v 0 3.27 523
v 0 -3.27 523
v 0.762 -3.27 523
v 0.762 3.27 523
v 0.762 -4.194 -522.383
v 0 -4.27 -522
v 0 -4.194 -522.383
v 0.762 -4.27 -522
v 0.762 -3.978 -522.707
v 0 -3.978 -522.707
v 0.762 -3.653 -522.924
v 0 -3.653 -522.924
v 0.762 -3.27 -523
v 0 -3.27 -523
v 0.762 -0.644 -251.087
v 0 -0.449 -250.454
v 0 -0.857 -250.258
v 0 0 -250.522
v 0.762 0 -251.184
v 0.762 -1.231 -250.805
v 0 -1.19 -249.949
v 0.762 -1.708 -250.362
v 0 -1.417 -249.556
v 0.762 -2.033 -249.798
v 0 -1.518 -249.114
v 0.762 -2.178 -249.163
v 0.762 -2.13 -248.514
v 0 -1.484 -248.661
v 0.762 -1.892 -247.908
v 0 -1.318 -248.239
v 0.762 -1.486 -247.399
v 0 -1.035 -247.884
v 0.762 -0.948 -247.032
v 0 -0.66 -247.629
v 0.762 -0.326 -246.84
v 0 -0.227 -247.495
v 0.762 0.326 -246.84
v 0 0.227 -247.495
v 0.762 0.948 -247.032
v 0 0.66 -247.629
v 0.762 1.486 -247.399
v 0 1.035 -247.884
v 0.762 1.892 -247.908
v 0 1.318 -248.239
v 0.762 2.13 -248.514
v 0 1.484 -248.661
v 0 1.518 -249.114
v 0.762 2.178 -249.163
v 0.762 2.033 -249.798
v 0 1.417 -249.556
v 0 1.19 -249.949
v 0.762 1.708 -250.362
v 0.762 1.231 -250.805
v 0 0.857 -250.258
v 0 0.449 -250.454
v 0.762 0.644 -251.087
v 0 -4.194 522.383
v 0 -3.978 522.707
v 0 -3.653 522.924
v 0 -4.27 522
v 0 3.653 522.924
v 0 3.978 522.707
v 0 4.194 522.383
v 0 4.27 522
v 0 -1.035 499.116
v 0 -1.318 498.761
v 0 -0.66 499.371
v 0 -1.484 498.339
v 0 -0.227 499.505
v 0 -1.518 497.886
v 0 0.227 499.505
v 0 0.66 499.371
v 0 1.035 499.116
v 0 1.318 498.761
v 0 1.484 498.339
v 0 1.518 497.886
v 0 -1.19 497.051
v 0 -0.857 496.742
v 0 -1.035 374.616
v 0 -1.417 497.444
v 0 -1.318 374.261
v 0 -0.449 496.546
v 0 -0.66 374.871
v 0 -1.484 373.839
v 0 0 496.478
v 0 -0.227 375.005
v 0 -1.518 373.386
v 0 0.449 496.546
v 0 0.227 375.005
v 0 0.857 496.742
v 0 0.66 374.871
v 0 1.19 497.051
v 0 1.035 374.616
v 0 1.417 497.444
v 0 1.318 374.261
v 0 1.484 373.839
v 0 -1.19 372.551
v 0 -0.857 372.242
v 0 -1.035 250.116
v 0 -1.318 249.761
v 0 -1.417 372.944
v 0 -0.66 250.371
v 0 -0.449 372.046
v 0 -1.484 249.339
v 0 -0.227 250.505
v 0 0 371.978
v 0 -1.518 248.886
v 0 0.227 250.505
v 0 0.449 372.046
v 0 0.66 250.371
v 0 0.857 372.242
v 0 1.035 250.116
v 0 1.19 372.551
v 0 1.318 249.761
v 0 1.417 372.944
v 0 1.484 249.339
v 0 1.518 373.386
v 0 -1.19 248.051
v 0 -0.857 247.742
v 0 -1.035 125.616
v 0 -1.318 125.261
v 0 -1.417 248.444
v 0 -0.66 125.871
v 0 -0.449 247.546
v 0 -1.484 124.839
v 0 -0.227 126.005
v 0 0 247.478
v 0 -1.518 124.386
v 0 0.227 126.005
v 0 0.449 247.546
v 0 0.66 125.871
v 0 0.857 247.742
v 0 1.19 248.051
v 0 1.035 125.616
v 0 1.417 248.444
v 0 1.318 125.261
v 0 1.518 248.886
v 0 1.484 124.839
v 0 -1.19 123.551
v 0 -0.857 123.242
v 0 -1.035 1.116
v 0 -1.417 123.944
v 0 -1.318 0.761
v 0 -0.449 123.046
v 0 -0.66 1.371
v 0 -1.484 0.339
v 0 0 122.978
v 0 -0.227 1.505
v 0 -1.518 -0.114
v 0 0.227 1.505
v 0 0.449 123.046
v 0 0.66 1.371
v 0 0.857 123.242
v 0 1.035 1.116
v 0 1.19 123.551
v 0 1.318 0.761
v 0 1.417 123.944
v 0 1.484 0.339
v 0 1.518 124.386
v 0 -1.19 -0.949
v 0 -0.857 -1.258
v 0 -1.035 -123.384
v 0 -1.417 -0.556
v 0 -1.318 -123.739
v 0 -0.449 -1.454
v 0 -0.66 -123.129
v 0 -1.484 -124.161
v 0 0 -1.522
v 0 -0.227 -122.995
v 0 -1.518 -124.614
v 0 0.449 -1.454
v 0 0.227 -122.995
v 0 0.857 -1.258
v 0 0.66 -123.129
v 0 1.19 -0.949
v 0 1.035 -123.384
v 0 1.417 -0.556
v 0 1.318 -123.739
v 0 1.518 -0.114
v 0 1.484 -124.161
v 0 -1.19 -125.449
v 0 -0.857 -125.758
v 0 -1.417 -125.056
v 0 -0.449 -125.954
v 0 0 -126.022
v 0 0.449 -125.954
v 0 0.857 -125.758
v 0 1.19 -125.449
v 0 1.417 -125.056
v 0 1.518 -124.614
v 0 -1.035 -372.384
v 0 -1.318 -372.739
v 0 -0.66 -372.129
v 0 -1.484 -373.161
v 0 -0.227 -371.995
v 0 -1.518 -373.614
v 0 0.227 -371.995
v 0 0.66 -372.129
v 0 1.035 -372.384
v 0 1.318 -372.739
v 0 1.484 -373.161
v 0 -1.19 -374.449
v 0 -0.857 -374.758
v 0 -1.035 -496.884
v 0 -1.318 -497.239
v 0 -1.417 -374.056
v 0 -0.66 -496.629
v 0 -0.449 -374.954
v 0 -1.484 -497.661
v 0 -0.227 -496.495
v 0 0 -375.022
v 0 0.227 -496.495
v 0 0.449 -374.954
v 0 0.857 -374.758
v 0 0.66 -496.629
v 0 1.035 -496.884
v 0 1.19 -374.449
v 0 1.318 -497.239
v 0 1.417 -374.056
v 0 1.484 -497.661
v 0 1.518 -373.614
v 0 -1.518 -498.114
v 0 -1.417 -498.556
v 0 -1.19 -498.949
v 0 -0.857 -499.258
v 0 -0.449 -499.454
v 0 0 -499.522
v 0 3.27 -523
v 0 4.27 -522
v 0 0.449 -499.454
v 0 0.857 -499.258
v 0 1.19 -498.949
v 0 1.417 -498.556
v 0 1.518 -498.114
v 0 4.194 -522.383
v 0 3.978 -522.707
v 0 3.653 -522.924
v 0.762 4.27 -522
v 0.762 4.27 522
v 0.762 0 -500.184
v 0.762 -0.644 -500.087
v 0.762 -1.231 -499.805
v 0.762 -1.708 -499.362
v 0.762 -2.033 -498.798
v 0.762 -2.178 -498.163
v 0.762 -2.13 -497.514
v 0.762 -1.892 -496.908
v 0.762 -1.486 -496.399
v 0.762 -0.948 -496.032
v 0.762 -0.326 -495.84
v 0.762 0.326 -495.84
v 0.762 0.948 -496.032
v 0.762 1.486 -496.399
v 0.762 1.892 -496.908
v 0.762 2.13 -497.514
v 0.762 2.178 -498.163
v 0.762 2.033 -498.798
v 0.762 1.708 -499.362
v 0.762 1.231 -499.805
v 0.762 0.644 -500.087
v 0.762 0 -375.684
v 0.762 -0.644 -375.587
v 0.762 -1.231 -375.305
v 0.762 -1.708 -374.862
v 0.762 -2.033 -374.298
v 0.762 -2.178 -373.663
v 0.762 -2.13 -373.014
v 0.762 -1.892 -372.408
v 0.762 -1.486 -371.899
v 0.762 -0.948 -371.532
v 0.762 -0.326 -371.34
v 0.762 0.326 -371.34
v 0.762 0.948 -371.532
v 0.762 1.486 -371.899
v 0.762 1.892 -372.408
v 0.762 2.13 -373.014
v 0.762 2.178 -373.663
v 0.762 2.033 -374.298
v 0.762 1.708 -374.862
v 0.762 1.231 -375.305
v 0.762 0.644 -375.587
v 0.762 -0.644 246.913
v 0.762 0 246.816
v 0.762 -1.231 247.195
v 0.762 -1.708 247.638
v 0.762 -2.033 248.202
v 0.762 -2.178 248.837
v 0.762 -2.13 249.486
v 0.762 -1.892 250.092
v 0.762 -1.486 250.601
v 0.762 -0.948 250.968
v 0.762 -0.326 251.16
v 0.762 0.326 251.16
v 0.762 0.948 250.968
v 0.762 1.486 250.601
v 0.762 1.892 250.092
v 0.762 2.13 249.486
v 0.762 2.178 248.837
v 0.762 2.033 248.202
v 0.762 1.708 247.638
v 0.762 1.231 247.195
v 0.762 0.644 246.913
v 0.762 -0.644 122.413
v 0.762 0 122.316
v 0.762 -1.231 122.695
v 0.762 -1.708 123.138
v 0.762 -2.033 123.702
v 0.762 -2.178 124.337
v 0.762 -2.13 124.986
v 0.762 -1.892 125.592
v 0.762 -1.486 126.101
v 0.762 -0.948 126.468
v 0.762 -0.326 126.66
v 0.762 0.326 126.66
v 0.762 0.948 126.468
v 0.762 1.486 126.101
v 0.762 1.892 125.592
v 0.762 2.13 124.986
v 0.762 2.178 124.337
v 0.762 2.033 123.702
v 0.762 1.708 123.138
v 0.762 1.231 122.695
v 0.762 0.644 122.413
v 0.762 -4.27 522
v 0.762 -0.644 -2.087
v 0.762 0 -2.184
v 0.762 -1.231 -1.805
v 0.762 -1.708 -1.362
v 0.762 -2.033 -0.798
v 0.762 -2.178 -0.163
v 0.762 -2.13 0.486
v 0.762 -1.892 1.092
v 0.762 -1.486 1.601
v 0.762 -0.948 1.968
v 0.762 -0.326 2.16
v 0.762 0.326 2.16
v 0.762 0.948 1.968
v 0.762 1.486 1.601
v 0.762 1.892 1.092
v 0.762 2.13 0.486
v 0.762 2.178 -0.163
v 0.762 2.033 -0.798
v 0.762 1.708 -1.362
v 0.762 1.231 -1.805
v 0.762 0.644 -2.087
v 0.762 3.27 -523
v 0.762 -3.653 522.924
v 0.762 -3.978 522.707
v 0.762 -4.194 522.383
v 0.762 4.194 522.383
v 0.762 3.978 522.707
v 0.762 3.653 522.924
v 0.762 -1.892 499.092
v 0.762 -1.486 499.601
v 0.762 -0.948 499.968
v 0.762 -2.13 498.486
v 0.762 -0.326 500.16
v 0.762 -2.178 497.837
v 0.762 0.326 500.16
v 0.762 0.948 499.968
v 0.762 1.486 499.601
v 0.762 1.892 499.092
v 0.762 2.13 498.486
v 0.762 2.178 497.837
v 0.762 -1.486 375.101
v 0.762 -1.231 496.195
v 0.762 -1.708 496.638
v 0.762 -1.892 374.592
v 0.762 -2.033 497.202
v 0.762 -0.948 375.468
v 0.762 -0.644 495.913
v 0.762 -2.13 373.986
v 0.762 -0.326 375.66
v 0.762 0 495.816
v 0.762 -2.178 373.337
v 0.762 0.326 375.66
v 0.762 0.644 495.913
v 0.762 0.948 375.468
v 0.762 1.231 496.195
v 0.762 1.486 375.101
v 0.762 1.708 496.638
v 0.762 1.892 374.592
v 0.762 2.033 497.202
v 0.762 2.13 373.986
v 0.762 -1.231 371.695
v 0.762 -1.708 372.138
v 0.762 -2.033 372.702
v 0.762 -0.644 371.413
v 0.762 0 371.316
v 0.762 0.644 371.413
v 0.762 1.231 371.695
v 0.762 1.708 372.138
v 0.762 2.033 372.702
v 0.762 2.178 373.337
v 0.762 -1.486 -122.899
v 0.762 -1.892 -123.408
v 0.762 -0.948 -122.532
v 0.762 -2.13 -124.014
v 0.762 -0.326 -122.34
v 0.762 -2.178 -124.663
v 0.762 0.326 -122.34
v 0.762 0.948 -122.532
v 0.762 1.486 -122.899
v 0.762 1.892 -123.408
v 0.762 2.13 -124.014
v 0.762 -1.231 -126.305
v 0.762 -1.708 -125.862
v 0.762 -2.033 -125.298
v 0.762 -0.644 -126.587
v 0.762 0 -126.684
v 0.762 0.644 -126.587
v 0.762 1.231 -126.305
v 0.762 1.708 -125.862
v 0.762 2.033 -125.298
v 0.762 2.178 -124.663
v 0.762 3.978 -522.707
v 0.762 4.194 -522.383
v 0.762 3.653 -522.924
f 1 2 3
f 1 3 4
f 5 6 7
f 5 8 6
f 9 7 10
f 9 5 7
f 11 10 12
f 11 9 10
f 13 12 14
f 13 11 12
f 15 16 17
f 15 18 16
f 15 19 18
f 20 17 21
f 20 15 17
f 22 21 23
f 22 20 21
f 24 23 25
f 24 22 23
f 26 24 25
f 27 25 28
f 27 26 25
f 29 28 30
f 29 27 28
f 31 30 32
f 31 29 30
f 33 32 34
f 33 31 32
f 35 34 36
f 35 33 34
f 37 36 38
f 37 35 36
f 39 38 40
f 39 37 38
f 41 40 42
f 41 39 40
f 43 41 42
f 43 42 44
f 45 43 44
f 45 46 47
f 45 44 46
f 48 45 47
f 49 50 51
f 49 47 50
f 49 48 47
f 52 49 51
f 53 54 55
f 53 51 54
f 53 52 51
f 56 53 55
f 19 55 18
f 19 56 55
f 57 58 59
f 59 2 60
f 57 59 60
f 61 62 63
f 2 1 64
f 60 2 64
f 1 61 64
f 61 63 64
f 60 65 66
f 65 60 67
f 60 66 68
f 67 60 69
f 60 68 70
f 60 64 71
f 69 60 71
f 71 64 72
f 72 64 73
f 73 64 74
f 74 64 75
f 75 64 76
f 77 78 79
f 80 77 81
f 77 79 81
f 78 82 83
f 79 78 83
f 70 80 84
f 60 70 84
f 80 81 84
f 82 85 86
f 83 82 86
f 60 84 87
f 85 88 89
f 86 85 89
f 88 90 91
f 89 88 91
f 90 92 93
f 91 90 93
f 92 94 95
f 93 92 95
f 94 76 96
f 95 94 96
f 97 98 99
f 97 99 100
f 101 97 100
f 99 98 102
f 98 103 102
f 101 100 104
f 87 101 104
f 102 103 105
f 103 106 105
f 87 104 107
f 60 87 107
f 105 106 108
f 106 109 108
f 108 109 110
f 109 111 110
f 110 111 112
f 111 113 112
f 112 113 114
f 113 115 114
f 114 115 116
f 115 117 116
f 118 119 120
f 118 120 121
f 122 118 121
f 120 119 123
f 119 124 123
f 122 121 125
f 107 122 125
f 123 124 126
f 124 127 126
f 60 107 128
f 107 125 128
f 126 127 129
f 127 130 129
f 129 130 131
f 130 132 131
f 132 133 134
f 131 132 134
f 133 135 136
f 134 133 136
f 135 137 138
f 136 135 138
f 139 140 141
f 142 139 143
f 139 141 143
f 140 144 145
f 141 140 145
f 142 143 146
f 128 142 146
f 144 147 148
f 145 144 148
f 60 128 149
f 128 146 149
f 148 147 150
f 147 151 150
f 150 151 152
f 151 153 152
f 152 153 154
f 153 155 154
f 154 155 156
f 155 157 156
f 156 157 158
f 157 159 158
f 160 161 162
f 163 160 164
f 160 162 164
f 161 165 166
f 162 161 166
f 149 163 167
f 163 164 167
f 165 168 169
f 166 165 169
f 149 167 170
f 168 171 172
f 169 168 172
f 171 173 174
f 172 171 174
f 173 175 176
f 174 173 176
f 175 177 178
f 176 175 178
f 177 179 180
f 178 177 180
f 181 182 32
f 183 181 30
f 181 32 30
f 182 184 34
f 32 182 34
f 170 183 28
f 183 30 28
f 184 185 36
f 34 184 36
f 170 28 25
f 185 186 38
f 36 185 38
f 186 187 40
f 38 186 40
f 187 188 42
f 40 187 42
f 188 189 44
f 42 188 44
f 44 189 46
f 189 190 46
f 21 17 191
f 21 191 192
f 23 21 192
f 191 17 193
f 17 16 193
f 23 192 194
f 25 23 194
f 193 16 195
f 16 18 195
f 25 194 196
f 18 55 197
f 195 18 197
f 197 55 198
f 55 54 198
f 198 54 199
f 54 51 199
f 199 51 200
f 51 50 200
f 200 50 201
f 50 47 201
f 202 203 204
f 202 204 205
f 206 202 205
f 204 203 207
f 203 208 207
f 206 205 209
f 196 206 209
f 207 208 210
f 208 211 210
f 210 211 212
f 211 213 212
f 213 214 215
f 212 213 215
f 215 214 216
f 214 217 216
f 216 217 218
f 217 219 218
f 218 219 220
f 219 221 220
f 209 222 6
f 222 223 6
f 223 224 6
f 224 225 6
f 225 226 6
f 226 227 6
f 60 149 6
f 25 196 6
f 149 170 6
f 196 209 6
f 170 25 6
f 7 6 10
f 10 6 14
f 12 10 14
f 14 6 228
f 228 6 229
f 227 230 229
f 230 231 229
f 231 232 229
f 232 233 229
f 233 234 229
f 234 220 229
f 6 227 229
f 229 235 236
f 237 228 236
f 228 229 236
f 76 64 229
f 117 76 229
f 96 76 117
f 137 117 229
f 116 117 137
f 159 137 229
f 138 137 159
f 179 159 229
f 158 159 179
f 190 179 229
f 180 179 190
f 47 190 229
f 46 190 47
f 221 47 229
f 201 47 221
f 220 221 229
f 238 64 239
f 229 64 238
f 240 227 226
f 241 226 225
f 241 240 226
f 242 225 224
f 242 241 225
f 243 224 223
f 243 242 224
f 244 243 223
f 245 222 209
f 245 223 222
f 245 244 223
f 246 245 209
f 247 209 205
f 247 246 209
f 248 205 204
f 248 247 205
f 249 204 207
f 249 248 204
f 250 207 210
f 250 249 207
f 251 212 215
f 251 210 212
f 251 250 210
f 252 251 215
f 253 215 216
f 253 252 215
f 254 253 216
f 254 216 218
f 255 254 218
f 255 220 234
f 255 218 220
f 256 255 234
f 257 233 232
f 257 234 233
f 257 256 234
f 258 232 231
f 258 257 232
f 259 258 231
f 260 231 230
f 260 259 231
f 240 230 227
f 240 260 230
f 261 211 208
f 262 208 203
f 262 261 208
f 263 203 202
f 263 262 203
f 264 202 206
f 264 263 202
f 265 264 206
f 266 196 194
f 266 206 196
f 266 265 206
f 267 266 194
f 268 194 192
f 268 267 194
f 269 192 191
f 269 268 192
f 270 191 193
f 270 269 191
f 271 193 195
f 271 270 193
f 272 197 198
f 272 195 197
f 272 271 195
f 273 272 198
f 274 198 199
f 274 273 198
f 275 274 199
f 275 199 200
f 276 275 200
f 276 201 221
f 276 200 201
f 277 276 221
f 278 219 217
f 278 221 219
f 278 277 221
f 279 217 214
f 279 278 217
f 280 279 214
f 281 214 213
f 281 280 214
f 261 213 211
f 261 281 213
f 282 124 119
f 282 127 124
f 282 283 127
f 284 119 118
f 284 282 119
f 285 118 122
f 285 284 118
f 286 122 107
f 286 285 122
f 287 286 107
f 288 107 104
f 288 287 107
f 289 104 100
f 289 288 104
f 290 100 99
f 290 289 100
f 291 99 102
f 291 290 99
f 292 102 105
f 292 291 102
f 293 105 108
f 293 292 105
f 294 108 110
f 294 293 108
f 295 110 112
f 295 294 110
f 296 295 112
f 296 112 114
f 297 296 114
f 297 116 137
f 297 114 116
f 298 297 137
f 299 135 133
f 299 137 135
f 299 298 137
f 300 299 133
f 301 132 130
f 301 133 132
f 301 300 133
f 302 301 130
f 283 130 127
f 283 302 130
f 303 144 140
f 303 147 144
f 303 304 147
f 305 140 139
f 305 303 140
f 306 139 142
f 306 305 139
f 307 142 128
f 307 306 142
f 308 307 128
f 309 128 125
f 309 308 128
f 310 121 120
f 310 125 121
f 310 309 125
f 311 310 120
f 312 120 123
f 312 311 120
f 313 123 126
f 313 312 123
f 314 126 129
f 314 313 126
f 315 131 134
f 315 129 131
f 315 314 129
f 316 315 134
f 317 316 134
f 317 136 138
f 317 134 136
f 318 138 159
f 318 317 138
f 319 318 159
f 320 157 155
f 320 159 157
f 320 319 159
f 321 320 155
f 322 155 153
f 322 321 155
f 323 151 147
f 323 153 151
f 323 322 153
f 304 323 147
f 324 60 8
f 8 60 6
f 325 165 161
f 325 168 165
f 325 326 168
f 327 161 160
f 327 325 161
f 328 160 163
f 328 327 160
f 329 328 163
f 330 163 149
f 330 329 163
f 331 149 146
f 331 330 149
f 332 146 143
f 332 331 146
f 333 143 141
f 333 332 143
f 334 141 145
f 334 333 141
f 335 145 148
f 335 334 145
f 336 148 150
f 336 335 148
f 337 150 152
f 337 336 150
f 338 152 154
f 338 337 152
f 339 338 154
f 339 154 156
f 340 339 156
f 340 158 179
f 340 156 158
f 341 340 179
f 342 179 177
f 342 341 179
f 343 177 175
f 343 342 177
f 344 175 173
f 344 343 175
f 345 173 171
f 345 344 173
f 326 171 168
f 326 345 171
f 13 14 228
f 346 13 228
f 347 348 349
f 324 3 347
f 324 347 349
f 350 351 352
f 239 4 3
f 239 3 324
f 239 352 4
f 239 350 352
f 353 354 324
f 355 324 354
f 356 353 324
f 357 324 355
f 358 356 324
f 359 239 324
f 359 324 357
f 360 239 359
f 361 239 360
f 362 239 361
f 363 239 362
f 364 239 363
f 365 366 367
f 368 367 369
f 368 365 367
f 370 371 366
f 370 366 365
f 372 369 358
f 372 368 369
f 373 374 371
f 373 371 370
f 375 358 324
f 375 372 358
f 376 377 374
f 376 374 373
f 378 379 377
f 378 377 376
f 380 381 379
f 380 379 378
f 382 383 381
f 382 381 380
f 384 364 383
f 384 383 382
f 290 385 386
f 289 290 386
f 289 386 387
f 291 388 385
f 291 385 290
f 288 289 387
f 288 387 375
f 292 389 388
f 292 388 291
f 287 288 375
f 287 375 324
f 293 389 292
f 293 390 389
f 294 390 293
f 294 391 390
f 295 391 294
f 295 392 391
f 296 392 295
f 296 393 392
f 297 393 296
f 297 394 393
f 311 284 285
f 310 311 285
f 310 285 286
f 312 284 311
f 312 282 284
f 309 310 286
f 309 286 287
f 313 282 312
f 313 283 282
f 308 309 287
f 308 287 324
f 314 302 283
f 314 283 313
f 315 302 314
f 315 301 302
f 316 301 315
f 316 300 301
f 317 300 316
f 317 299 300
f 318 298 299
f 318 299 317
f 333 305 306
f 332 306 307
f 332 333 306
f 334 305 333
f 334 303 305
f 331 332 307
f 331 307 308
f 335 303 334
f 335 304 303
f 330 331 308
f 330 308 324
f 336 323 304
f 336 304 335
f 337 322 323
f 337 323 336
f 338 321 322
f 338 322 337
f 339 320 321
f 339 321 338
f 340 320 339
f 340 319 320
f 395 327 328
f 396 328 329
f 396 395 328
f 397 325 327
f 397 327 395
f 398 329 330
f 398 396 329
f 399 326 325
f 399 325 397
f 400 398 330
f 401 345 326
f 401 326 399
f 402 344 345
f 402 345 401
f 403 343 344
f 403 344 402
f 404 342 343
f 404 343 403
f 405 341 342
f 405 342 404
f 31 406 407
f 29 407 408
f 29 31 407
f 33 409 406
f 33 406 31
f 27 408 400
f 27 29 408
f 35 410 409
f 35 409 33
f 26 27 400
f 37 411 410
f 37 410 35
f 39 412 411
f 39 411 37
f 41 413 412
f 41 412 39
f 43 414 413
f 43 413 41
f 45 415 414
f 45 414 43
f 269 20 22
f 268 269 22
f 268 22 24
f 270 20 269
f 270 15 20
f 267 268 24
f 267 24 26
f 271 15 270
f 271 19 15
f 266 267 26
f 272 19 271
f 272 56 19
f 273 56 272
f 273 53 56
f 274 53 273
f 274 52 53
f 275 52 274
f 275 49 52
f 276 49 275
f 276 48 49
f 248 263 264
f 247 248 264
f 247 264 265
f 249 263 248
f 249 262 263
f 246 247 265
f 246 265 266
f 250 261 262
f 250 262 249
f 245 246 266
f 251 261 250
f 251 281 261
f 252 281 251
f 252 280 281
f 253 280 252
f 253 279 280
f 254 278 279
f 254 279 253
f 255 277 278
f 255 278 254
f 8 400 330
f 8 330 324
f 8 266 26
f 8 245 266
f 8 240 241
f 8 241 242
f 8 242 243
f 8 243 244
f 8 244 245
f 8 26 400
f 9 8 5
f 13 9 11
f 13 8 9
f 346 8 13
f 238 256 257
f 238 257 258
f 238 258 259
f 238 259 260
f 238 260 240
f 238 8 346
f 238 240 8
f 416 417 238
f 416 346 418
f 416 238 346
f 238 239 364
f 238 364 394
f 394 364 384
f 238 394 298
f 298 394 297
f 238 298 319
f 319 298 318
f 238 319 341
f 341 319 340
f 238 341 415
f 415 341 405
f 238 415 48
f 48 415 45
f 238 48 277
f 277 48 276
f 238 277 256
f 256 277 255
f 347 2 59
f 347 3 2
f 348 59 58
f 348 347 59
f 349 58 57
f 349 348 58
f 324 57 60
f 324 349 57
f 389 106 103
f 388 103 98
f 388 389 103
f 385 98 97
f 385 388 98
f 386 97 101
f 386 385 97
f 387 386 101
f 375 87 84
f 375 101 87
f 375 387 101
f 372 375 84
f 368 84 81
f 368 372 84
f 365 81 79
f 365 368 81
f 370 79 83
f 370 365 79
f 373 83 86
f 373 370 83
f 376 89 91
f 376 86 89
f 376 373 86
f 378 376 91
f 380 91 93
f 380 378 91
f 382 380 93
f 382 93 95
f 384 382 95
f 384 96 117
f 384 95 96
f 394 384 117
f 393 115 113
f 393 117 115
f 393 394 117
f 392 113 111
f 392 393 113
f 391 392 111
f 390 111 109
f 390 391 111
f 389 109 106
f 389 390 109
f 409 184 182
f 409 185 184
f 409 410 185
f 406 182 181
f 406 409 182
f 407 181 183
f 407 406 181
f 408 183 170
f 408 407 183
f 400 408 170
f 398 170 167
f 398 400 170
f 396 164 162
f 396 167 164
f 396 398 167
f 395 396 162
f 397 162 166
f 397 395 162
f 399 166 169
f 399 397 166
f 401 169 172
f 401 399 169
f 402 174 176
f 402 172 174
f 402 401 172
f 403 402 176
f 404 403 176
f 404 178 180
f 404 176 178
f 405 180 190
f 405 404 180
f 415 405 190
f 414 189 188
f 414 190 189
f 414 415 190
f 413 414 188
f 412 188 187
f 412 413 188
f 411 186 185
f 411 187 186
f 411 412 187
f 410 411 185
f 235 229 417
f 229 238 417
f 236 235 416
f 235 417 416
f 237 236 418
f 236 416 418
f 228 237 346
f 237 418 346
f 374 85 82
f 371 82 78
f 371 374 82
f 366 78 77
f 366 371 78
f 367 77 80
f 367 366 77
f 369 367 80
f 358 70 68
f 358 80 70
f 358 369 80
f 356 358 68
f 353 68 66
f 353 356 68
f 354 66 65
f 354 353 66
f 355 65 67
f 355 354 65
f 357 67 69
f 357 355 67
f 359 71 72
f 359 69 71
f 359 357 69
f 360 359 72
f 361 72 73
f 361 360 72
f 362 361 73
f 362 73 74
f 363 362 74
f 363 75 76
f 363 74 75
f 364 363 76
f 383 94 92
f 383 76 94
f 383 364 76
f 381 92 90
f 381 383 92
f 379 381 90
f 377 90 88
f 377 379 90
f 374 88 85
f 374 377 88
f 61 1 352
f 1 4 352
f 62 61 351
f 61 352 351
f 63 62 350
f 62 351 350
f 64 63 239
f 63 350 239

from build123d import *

# Parameters (mm, degrees)
SKETCH1_W           = 1046
SKETCH1_H           = 8.541
BOSS_EXTRUDE1_DEPTH = 0.762
LPATTERN1_COUNT     = 9
LPATTERN1_PITCH     = 124.5
FILLET2_R           = 1


with BuildPart() as part:
    # Sketch1 → Boss-Extrude1 (new body)
    with BuildSketch(Plane(origin=(0, 0, 0), x_dir=(0, 0, -1), z_dir=(1, 0, 0))):
        Rectangle(SKETCH1_W, SKETCH1_H)
    extrude(amount=BOSS_EXTRUDE1_DEPTH)

    # Sketch2 → CSK for #2 Flat Head Machine Screw1 (revolve, cut)
    with BuildSketch(Plane(origin=(0.762, 0, 498), x_dir=(0, 0, -1), z_dir=(0, 1, 0))):
        Polygon((0, 0), (0, 0.762), (1.2192, 0.762), (1.2192, 1.110335587), (2.1844, 0), align=None)
    csk_for_2_flat_head_machine_screw1 = revolve(axis=Axis((7.112, 0, 498), (-1, 0, 0)), mode=Mode.SUBTRACT)

    # LPattern1: CSK for #2 Flat Head Machine Screw1 ×9
    with Locations(*[(0, 0, -i * LPATTERN1_PITCH) for i in range(1, LPATTERN1_COUNT)]):
        add(csk_for_2_flat_head_machine_screw1, mode=Mode.SUBTRACT)

    # Fillet2
    fillet2_edges = [part.edges().sort_by_distance(p)[0] for p in [
        (0.381, -4.2705, -523),
        (0.381, -4.2705, 523),
        (0.381, 4.2705, 523),
        (0.381, 4.2705, -523),
    ]]
    fillet(fillet2_edges, radius=FILLET2_R)


solid = part.part
